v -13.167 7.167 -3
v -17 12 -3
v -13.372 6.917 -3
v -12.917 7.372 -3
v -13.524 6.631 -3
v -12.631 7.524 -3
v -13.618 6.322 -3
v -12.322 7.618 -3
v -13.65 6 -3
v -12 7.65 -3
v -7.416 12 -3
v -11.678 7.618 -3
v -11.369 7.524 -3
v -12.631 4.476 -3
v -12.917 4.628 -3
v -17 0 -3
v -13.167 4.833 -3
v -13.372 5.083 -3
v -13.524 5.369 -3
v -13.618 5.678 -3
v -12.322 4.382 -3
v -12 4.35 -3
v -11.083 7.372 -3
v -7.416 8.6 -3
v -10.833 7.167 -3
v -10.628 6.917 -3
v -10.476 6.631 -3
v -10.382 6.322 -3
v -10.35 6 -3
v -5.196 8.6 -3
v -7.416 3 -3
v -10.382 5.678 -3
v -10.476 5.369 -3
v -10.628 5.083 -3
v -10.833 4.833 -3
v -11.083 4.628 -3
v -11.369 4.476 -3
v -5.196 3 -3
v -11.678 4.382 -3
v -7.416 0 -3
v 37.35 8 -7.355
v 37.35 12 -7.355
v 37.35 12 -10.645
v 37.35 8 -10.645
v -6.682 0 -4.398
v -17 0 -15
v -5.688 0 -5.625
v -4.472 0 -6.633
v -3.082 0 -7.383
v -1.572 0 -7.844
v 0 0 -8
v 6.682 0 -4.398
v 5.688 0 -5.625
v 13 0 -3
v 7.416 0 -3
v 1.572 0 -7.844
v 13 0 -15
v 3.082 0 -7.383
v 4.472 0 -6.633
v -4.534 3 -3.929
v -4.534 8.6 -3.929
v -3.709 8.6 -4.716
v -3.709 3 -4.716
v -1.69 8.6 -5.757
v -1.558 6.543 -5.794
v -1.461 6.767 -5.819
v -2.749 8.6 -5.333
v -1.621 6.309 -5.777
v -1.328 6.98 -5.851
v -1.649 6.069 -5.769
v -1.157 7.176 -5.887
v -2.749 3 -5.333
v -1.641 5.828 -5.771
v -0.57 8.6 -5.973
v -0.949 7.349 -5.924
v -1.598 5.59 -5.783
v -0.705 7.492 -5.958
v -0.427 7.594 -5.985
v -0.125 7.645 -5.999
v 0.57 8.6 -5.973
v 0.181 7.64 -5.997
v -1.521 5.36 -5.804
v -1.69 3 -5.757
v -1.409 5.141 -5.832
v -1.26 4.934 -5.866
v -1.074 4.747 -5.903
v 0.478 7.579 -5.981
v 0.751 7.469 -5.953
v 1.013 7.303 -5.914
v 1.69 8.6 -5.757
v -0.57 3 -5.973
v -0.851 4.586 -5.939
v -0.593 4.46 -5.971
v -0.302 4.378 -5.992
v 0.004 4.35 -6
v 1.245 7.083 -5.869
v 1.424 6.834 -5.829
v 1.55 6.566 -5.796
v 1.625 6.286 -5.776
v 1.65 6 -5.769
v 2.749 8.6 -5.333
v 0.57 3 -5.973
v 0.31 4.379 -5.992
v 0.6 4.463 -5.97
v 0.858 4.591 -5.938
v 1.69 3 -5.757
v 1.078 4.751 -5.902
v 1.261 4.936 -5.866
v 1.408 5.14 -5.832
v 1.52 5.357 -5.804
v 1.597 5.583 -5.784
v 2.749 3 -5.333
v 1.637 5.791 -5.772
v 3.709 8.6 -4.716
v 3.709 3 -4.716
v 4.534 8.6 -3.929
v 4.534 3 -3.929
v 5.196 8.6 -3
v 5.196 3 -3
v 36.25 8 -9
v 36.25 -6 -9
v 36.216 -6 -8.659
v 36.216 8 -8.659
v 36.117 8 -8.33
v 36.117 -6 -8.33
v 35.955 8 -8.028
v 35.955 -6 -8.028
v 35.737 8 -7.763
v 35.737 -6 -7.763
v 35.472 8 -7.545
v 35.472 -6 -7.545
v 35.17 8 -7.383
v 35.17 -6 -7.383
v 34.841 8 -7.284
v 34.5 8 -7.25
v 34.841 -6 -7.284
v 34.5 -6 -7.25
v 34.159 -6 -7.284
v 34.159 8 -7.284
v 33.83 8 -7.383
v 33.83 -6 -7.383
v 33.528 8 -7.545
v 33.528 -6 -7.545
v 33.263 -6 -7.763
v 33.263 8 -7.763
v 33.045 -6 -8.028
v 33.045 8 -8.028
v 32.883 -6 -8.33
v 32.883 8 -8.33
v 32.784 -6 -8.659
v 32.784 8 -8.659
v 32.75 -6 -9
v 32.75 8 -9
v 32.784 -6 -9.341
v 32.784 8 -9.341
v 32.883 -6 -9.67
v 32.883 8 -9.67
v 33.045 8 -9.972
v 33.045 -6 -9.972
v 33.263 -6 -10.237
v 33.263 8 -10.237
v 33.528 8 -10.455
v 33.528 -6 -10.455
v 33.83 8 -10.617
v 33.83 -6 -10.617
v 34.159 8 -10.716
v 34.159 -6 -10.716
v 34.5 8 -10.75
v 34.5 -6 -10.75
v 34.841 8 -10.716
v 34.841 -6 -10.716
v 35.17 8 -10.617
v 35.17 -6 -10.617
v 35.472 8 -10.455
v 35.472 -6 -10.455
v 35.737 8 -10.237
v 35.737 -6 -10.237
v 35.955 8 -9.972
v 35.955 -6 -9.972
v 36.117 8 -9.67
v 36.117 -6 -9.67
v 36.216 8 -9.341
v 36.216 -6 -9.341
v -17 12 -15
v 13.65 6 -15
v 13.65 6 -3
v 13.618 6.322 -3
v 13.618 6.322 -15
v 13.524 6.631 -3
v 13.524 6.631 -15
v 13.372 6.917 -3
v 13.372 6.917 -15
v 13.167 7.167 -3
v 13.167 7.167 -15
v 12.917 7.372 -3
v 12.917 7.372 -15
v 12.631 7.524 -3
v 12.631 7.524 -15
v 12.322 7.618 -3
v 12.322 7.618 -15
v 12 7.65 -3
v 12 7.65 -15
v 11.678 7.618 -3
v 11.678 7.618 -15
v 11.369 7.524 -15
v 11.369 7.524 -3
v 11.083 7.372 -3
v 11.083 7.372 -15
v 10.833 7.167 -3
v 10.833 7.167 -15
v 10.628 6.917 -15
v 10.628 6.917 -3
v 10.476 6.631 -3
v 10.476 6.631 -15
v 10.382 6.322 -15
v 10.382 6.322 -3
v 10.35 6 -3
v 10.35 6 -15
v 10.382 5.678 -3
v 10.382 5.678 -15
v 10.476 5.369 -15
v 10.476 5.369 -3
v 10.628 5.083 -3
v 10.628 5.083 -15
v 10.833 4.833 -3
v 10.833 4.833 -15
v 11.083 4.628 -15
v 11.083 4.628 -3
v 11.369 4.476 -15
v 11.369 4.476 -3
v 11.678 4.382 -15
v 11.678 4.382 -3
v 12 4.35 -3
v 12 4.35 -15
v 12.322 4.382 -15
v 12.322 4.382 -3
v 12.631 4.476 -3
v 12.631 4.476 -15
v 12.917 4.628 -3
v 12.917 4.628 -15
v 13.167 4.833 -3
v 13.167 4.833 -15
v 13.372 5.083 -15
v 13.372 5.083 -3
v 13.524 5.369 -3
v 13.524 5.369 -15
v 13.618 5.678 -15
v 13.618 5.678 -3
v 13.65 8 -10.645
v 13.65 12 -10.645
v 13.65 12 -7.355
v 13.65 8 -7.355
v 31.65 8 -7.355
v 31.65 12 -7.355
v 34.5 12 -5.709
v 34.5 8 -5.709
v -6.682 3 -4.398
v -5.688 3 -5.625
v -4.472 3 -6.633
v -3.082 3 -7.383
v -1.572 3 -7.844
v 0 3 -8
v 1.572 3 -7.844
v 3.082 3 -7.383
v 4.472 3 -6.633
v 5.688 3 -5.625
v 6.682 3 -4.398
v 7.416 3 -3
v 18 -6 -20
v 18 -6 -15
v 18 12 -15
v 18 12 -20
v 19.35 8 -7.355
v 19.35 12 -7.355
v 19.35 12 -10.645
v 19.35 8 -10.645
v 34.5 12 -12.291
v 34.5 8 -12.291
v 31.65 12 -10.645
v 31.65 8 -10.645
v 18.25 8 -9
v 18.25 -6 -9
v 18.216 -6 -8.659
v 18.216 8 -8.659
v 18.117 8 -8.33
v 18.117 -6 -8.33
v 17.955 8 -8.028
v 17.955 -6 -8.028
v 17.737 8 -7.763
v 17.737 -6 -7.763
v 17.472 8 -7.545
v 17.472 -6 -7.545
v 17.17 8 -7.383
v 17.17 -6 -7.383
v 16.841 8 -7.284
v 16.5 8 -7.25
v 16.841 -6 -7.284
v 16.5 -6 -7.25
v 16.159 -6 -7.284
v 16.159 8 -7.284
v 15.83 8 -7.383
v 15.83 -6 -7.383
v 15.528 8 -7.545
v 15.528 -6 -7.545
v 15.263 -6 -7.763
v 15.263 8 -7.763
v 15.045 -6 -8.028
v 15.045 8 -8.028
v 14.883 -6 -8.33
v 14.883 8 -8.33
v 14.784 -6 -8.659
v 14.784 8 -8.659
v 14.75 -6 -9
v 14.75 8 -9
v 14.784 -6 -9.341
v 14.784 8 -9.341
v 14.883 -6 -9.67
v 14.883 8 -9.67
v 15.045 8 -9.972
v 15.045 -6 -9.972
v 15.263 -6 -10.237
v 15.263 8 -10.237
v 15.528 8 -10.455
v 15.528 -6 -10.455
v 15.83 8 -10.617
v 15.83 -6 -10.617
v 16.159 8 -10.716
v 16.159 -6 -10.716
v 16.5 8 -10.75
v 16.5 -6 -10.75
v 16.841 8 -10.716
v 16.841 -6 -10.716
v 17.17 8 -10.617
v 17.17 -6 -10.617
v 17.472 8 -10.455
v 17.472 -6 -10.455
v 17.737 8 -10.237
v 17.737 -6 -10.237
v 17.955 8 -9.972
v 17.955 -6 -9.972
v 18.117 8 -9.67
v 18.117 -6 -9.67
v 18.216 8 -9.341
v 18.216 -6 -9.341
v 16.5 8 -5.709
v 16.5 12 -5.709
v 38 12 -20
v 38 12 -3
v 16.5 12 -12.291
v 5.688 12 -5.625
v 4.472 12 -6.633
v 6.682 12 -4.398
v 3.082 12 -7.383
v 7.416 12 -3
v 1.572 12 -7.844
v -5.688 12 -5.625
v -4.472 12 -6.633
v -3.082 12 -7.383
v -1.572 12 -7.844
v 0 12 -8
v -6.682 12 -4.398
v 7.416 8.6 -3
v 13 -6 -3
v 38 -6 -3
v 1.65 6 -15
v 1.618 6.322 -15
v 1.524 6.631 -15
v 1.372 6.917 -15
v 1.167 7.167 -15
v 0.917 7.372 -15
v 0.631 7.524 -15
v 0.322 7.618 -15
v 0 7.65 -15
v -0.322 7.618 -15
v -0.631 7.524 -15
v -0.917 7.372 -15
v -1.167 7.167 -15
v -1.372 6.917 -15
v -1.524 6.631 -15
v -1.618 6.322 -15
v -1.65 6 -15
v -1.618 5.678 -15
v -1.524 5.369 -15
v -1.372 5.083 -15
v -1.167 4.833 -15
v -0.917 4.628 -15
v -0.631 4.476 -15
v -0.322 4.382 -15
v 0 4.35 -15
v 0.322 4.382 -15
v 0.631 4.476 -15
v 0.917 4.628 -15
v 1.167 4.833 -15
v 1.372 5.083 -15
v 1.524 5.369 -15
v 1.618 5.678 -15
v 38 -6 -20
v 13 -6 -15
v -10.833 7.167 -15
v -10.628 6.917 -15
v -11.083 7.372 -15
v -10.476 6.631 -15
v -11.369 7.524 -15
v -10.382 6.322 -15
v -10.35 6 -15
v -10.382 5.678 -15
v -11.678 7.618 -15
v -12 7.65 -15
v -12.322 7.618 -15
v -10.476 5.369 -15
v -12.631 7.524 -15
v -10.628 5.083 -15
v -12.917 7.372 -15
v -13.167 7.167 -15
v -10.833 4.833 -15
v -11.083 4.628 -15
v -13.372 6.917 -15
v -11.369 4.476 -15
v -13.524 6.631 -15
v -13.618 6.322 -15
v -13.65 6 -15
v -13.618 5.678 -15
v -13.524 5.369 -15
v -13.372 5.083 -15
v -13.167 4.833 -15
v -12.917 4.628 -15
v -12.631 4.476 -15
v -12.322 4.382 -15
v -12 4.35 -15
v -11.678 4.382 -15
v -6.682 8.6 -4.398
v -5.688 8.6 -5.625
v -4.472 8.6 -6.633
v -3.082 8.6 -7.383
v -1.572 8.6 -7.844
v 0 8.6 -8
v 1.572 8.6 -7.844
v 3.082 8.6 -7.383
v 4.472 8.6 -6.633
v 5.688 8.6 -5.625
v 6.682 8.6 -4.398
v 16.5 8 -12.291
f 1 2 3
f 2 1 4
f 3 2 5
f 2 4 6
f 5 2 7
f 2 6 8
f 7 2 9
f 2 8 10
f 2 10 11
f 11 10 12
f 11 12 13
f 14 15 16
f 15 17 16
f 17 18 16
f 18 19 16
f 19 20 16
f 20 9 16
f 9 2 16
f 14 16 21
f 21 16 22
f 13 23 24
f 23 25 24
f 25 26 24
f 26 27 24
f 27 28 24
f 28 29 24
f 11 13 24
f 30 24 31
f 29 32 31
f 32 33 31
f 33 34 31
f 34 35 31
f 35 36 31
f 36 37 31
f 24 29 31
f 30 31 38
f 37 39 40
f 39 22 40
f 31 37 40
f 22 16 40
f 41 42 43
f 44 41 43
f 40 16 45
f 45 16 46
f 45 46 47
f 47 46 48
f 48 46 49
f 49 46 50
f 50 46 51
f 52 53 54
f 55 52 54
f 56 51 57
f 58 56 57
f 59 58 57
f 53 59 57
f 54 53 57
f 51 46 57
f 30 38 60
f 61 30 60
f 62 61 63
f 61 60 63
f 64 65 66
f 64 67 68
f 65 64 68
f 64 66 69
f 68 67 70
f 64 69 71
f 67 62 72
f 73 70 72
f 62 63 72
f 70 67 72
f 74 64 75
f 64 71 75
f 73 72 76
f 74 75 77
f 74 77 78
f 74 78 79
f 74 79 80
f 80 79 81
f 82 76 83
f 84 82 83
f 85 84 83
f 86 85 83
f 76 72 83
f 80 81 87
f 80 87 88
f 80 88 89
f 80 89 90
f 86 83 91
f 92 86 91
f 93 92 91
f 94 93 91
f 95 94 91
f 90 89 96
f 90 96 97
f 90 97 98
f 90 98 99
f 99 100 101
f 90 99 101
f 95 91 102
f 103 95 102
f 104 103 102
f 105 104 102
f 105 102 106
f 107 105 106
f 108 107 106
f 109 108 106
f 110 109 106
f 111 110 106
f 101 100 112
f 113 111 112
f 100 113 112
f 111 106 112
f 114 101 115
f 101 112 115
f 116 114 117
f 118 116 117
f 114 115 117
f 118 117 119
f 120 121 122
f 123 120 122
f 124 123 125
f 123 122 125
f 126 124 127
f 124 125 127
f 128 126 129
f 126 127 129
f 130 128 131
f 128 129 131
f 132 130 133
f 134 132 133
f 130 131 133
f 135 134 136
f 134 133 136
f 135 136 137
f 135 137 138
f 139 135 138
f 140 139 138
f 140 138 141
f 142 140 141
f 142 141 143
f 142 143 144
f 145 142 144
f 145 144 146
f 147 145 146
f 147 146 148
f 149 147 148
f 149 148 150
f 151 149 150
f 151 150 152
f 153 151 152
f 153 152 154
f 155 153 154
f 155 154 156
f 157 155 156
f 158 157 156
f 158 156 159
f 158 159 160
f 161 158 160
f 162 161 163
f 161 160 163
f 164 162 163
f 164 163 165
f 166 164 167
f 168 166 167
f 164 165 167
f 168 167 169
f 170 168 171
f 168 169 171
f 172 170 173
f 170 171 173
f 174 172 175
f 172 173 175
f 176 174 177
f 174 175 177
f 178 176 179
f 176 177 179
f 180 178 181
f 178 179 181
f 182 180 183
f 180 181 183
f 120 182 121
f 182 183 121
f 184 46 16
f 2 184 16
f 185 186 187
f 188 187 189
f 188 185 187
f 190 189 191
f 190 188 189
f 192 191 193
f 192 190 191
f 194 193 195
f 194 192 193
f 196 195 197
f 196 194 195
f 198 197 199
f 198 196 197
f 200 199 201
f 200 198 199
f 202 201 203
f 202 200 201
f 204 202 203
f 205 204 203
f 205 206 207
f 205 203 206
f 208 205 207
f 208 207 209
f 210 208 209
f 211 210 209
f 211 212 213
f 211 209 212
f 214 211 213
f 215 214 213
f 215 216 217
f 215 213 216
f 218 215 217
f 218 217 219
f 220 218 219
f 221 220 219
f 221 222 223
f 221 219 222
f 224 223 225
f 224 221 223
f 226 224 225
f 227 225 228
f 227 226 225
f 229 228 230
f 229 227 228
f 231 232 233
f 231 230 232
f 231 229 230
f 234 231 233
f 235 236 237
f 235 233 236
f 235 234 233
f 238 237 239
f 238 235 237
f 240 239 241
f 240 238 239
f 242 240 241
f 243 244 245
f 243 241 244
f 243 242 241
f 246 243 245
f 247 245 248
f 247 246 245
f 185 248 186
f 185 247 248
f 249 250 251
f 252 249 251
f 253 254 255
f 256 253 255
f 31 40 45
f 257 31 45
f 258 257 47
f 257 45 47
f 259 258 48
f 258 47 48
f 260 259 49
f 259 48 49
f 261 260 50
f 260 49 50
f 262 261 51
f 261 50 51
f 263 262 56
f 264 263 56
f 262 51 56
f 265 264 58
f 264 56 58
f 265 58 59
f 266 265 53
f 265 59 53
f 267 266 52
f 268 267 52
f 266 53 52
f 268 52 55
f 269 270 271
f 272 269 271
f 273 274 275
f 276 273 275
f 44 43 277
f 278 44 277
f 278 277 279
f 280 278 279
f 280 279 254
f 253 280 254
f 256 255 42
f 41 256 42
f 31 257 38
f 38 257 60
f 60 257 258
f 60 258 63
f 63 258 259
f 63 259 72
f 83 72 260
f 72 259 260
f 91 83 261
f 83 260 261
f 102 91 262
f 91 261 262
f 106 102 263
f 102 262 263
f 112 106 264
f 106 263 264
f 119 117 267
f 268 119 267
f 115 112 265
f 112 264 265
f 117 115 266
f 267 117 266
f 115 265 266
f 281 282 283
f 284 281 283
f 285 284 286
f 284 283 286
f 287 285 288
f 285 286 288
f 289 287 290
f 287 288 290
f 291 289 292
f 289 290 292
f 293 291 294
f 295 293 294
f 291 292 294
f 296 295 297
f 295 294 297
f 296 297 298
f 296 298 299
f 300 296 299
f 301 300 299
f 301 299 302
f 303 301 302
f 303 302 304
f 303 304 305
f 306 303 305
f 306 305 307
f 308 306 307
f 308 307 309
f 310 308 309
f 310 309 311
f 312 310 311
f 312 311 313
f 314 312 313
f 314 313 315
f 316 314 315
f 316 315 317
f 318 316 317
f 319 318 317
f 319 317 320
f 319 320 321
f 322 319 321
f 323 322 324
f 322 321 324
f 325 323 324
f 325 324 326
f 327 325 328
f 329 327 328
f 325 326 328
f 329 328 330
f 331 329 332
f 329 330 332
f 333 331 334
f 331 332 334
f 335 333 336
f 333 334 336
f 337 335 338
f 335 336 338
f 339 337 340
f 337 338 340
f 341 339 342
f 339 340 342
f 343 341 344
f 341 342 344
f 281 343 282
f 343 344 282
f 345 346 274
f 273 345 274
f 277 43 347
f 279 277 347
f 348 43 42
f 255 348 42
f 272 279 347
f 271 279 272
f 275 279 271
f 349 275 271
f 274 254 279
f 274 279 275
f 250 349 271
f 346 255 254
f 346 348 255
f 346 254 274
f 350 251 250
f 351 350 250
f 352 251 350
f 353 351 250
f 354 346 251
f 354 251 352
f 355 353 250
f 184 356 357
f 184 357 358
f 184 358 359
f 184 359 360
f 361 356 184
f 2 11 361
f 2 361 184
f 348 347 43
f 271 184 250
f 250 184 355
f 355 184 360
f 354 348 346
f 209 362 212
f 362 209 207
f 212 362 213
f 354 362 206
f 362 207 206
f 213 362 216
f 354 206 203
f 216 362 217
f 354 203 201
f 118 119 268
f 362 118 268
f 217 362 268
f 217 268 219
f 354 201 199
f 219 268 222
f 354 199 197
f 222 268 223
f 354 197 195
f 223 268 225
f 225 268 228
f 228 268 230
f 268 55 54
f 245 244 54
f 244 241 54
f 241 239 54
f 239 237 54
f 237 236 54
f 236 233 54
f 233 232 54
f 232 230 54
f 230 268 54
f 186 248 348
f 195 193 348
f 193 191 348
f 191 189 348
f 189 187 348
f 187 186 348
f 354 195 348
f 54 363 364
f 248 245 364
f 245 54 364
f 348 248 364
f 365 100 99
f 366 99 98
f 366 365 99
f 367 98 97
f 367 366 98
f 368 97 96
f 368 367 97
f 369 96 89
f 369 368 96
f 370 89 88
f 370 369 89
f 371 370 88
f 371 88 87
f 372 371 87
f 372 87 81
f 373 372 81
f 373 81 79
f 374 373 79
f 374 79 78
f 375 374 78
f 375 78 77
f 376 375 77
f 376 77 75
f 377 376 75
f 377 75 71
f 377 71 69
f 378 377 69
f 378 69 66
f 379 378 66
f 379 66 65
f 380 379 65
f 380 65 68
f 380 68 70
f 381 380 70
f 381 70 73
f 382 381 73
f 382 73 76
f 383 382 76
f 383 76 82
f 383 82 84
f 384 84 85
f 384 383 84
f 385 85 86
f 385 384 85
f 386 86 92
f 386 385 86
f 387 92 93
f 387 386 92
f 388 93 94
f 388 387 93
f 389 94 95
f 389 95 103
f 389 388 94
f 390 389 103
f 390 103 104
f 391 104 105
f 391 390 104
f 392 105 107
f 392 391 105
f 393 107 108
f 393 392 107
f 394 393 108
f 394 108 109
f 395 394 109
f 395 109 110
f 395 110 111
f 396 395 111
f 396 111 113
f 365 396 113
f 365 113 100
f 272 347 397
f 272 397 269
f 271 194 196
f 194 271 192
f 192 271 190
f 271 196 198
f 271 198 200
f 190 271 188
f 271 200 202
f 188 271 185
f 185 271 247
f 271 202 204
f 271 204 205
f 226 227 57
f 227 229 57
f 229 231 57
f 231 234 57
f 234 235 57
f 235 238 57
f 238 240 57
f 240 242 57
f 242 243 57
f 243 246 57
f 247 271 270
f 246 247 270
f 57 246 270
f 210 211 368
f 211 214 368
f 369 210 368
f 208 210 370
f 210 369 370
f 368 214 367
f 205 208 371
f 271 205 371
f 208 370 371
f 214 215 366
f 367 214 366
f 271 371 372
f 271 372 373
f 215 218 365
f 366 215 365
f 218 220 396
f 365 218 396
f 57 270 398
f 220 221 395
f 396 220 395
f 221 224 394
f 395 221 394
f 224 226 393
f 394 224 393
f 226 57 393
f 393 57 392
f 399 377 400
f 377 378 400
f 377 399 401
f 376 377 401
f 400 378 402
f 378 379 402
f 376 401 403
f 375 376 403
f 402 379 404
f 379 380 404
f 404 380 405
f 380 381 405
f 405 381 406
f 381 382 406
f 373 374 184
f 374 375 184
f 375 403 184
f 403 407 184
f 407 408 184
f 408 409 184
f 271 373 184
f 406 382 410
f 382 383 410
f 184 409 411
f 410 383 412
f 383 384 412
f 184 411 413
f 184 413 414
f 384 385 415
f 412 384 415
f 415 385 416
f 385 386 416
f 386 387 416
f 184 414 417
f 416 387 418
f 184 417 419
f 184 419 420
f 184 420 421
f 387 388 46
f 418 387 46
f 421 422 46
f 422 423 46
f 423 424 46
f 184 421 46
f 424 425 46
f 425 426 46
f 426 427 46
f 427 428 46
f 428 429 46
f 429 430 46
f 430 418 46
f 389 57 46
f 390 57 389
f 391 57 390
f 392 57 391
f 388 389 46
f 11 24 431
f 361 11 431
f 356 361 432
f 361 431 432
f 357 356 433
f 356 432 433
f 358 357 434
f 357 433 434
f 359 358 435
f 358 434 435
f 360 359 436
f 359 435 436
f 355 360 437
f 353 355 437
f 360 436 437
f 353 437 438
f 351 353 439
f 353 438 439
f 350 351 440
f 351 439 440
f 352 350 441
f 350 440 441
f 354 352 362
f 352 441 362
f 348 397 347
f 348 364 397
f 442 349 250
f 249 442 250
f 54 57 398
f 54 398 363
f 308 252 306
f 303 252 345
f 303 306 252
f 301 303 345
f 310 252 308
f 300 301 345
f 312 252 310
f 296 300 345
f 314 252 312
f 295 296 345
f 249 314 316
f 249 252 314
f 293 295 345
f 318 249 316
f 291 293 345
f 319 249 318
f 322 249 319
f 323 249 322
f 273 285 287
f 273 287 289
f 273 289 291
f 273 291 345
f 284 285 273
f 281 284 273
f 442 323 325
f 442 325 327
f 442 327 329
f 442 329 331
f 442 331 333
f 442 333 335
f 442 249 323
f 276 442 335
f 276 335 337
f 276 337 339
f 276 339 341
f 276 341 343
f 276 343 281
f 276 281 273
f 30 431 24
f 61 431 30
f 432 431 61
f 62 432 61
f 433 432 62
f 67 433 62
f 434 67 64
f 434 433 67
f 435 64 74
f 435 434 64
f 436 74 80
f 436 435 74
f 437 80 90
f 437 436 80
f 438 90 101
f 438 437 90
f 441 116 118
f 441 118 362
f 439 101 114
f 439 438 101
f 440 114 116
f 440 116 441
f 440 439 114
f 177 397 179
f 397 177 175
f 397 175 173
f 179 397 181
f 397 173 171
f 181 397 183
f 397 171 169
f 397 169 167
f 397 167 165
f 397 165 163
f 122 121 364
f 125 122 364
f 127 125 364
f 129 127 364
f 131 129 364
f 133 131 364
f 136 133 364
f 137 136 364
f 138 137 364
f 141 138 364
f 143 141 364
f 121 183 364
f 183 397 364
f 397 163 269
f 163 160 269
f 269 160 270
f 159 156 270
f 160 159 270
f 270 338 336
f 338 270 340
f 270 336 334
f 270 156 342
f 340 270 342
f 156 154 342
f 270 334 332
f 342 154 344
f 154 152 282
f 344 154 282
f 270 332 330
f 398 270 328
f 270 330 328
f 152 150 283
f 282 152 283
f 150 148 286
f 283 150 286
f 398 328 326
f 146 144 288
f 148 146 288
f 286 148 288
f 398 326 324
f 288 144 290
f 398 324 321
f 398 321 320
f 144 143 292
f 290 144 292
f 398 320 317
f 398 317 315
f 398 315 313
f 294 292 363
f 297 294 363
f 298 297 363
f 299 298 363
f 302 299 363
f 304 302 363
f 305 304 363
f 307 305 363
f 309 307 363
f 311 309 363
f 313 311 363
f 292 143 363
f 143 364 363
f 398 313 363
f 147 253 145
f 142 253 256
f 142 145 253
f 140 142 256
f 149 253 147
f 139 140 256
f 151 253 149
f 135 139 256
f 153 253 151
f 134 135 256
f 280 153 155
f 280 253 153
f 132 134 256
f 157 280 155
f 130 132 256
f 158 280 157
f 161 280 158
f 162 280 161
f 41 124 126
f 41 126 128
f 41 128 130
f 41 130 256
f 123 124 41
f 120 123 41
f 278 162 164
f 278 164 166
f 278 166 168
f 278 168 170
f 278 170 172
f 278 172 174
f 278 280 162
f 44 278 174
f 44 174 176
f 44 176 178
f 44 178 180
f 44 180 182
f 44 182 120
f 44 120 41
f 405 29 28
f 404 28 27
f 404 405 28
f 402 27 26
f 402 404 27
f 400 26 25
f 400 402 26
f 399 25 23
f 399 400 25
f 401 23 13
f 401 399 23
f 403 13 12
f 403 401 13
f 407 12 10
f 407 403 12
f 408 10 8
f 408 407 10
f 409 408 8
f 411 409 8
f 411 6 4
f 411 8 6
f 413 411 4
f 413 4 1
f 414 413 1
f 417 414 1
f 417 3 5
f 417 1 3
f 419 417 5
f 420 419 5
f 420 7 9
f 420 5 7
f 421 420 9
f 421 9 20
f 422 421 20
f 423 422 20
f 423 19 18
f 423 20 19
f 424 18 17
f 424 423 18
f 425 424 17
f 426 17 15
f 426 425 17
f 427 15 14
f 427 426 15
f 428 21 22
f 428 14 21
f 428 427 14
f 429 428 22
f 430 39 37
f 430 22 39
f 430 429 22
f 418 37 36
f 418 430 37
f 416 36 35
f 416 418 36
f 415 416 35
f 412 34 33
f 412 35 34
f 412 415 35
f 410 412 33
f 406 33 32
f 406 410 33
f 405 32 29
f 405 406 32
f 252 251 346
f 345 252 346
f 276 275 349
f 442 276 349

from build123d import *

# Parameters (mm, degrees)
EXTRUDE_1_DEPTH     = 3
EXTRUDE_2_DEPTH     = 5.6
EXTRUDE_3_DEPTH     = 3.4
SKETCH_5_W          = 25
SKETCH_5_H          = 12
EXTRUDE_4_DEPTH     = 18
SKETCH_8_W          = 20
SKETCH_8_H          = 18
EXTRUDE_5_DEPTH     = 5
SKETCH_4_R          = 1.65
CUT_EXTRUDE_1_DEPTH = 13
SKETCH_6_R          = 1.75
CUT_EXTRUDE_2_DEPTH = 19
CUT_EXTRUDE_3_DEPTH = 4


with BuildPart() as part:
    # 草图1 → 凸台-拉伸1 (new body)
    with BuildSketch(Plane(origin=(0, 0, 0), x_dir=(1, 0, 0), z_dir=(0, 1, 0))):
        with BuildLine():
            Line((17, 3), (17, 15))
            Line((17, 15), (-17, 15))
            Line((-17, 15), (-17, 3))
            Line((-17, 3), (-7.416198487, 3))
            ThreePointArc((-7.416198487, 3), (0, 8), (7.416198487, 3))
            Line((7.416198487, 3), (17, 3))
        make_face()
    extrude(amount=EXTRUDE_1_DEPTH)

    # 草图2 → 凸台-拉伸2 (add)
    with BuildSketch(Plane(origin=(0, 3, 0), x_dir=(1, 0, 0), z_dir=(0, 1, 0))):
        with BuildLine():
            Line((5.196152423, 3), (17, 3))
            Line((17, 3), (17, 15))
            Line((17, 15), (-17, 15))
            Line((-17, 15), (-17, 3))
            Line((-17, 3), (-5.196152423, 3))
            ThreePointArc((-5.196152423, 3), (0, 6), (5.196152423, 3))
        make_face()
    extrude(amount=EXTRUDE_2_DEPTH)

    # 草图3 → 凸台-拉伸3 (add)
    with BuildSketch(Plane(origin=(0, 8.6, 0), x_dir=(1, 0, 0), z_dir=(0, 1, 0))):
        with BuildLine():
            Line((-17, 3), (-7.416198487, 3))
            ThreePointArc((-7.416198487, 3), (0, 8), (7.416198487, 3))
            Line((7.416198487, 3), (17, 3))
            Line((17, 3), (17, 15))
            Line((17, 15), (-17, 15))
            Line((-17, 15), (-17, 3))
        make_face()
    extrude(amount=EXTRUDE_3_DEPTH)

    # 草图5 → 凸台-拉伸4 (add)
    with BuildSketch(Plane.XZ.offset(-12)):
        with Locations((25.5, -9)):
            Rectangle(SKETCH_5_W, SKETCH_5_H)
    extrude(amount=EXTRUDE_4_DEPTH)

    # 草图8 → 凸台-拉伸5 (add)
    with BuildSketch(Plane(origin=(0, 0, -15), x_dir=(-1, 0, 0), z_dir=(0, 0, -1))):
        with Locations((-28, 3)):
            Rectangle(SKETCH_8_W, SKETCH_8_H)
    extrude(amount=EXTRUDE_5_DEPTH)

    # 草图4 → 切除-拉伸1 (cut, through all)
    with BuildSketch(Plane.XY.offset(-15)):
        with Locations((-12, 6)):
            Circle(SKETCH_4_R)
        with Locations((12, 6)):
            Circle(SKETCH_4_R)
        with Locations((0, 6)):
            Circle(SKETCH_4_R)
    extrude(amount=CUT_EXTRUDE_1_DEPTH, mode=Mode.SUBTRACT)

    # 草图6 → 切除-拉伸2 (cut, through all)
    with BuildSketch(Plane.XZ.offset(6)):
        with Locations((16.5, -9)):
            Circle(SKETCH_6_R)
        with Locations((34.5, -9)):
            Circle(SKETCH_6_R)
    extrude(amount=-CUT_EXTRUDE_2_DEPTH, mode=Mode.SUBTRACT)

    # 草图7 → 切除-拉伸3 (cut)
    with BuildSketch(Plane(origin=(0, 12, 0), x_dir=(1, 0, 0), z_dir=(0, 1, 0))):
        Polygon((16.5, 5.709103466), (19.35, 7.354551733), (19.35, 10.645448267), (16.5, 12.290896534), (13.65, 10.645448267), (13.65, 7.354551733), align=None)
        Polygon((34.5, 5.709103466), (37.35, 7.354551733), (37.35, 10.645448267), (34.5, 12.290896534), (31.65, 10.645448267), (31.65, 7.354551733), align=None)
    extrude(amount=-CUT_EXTRUDE_3_DEPTH, mode=Mode.SUBTRACT)


solid = part.part
